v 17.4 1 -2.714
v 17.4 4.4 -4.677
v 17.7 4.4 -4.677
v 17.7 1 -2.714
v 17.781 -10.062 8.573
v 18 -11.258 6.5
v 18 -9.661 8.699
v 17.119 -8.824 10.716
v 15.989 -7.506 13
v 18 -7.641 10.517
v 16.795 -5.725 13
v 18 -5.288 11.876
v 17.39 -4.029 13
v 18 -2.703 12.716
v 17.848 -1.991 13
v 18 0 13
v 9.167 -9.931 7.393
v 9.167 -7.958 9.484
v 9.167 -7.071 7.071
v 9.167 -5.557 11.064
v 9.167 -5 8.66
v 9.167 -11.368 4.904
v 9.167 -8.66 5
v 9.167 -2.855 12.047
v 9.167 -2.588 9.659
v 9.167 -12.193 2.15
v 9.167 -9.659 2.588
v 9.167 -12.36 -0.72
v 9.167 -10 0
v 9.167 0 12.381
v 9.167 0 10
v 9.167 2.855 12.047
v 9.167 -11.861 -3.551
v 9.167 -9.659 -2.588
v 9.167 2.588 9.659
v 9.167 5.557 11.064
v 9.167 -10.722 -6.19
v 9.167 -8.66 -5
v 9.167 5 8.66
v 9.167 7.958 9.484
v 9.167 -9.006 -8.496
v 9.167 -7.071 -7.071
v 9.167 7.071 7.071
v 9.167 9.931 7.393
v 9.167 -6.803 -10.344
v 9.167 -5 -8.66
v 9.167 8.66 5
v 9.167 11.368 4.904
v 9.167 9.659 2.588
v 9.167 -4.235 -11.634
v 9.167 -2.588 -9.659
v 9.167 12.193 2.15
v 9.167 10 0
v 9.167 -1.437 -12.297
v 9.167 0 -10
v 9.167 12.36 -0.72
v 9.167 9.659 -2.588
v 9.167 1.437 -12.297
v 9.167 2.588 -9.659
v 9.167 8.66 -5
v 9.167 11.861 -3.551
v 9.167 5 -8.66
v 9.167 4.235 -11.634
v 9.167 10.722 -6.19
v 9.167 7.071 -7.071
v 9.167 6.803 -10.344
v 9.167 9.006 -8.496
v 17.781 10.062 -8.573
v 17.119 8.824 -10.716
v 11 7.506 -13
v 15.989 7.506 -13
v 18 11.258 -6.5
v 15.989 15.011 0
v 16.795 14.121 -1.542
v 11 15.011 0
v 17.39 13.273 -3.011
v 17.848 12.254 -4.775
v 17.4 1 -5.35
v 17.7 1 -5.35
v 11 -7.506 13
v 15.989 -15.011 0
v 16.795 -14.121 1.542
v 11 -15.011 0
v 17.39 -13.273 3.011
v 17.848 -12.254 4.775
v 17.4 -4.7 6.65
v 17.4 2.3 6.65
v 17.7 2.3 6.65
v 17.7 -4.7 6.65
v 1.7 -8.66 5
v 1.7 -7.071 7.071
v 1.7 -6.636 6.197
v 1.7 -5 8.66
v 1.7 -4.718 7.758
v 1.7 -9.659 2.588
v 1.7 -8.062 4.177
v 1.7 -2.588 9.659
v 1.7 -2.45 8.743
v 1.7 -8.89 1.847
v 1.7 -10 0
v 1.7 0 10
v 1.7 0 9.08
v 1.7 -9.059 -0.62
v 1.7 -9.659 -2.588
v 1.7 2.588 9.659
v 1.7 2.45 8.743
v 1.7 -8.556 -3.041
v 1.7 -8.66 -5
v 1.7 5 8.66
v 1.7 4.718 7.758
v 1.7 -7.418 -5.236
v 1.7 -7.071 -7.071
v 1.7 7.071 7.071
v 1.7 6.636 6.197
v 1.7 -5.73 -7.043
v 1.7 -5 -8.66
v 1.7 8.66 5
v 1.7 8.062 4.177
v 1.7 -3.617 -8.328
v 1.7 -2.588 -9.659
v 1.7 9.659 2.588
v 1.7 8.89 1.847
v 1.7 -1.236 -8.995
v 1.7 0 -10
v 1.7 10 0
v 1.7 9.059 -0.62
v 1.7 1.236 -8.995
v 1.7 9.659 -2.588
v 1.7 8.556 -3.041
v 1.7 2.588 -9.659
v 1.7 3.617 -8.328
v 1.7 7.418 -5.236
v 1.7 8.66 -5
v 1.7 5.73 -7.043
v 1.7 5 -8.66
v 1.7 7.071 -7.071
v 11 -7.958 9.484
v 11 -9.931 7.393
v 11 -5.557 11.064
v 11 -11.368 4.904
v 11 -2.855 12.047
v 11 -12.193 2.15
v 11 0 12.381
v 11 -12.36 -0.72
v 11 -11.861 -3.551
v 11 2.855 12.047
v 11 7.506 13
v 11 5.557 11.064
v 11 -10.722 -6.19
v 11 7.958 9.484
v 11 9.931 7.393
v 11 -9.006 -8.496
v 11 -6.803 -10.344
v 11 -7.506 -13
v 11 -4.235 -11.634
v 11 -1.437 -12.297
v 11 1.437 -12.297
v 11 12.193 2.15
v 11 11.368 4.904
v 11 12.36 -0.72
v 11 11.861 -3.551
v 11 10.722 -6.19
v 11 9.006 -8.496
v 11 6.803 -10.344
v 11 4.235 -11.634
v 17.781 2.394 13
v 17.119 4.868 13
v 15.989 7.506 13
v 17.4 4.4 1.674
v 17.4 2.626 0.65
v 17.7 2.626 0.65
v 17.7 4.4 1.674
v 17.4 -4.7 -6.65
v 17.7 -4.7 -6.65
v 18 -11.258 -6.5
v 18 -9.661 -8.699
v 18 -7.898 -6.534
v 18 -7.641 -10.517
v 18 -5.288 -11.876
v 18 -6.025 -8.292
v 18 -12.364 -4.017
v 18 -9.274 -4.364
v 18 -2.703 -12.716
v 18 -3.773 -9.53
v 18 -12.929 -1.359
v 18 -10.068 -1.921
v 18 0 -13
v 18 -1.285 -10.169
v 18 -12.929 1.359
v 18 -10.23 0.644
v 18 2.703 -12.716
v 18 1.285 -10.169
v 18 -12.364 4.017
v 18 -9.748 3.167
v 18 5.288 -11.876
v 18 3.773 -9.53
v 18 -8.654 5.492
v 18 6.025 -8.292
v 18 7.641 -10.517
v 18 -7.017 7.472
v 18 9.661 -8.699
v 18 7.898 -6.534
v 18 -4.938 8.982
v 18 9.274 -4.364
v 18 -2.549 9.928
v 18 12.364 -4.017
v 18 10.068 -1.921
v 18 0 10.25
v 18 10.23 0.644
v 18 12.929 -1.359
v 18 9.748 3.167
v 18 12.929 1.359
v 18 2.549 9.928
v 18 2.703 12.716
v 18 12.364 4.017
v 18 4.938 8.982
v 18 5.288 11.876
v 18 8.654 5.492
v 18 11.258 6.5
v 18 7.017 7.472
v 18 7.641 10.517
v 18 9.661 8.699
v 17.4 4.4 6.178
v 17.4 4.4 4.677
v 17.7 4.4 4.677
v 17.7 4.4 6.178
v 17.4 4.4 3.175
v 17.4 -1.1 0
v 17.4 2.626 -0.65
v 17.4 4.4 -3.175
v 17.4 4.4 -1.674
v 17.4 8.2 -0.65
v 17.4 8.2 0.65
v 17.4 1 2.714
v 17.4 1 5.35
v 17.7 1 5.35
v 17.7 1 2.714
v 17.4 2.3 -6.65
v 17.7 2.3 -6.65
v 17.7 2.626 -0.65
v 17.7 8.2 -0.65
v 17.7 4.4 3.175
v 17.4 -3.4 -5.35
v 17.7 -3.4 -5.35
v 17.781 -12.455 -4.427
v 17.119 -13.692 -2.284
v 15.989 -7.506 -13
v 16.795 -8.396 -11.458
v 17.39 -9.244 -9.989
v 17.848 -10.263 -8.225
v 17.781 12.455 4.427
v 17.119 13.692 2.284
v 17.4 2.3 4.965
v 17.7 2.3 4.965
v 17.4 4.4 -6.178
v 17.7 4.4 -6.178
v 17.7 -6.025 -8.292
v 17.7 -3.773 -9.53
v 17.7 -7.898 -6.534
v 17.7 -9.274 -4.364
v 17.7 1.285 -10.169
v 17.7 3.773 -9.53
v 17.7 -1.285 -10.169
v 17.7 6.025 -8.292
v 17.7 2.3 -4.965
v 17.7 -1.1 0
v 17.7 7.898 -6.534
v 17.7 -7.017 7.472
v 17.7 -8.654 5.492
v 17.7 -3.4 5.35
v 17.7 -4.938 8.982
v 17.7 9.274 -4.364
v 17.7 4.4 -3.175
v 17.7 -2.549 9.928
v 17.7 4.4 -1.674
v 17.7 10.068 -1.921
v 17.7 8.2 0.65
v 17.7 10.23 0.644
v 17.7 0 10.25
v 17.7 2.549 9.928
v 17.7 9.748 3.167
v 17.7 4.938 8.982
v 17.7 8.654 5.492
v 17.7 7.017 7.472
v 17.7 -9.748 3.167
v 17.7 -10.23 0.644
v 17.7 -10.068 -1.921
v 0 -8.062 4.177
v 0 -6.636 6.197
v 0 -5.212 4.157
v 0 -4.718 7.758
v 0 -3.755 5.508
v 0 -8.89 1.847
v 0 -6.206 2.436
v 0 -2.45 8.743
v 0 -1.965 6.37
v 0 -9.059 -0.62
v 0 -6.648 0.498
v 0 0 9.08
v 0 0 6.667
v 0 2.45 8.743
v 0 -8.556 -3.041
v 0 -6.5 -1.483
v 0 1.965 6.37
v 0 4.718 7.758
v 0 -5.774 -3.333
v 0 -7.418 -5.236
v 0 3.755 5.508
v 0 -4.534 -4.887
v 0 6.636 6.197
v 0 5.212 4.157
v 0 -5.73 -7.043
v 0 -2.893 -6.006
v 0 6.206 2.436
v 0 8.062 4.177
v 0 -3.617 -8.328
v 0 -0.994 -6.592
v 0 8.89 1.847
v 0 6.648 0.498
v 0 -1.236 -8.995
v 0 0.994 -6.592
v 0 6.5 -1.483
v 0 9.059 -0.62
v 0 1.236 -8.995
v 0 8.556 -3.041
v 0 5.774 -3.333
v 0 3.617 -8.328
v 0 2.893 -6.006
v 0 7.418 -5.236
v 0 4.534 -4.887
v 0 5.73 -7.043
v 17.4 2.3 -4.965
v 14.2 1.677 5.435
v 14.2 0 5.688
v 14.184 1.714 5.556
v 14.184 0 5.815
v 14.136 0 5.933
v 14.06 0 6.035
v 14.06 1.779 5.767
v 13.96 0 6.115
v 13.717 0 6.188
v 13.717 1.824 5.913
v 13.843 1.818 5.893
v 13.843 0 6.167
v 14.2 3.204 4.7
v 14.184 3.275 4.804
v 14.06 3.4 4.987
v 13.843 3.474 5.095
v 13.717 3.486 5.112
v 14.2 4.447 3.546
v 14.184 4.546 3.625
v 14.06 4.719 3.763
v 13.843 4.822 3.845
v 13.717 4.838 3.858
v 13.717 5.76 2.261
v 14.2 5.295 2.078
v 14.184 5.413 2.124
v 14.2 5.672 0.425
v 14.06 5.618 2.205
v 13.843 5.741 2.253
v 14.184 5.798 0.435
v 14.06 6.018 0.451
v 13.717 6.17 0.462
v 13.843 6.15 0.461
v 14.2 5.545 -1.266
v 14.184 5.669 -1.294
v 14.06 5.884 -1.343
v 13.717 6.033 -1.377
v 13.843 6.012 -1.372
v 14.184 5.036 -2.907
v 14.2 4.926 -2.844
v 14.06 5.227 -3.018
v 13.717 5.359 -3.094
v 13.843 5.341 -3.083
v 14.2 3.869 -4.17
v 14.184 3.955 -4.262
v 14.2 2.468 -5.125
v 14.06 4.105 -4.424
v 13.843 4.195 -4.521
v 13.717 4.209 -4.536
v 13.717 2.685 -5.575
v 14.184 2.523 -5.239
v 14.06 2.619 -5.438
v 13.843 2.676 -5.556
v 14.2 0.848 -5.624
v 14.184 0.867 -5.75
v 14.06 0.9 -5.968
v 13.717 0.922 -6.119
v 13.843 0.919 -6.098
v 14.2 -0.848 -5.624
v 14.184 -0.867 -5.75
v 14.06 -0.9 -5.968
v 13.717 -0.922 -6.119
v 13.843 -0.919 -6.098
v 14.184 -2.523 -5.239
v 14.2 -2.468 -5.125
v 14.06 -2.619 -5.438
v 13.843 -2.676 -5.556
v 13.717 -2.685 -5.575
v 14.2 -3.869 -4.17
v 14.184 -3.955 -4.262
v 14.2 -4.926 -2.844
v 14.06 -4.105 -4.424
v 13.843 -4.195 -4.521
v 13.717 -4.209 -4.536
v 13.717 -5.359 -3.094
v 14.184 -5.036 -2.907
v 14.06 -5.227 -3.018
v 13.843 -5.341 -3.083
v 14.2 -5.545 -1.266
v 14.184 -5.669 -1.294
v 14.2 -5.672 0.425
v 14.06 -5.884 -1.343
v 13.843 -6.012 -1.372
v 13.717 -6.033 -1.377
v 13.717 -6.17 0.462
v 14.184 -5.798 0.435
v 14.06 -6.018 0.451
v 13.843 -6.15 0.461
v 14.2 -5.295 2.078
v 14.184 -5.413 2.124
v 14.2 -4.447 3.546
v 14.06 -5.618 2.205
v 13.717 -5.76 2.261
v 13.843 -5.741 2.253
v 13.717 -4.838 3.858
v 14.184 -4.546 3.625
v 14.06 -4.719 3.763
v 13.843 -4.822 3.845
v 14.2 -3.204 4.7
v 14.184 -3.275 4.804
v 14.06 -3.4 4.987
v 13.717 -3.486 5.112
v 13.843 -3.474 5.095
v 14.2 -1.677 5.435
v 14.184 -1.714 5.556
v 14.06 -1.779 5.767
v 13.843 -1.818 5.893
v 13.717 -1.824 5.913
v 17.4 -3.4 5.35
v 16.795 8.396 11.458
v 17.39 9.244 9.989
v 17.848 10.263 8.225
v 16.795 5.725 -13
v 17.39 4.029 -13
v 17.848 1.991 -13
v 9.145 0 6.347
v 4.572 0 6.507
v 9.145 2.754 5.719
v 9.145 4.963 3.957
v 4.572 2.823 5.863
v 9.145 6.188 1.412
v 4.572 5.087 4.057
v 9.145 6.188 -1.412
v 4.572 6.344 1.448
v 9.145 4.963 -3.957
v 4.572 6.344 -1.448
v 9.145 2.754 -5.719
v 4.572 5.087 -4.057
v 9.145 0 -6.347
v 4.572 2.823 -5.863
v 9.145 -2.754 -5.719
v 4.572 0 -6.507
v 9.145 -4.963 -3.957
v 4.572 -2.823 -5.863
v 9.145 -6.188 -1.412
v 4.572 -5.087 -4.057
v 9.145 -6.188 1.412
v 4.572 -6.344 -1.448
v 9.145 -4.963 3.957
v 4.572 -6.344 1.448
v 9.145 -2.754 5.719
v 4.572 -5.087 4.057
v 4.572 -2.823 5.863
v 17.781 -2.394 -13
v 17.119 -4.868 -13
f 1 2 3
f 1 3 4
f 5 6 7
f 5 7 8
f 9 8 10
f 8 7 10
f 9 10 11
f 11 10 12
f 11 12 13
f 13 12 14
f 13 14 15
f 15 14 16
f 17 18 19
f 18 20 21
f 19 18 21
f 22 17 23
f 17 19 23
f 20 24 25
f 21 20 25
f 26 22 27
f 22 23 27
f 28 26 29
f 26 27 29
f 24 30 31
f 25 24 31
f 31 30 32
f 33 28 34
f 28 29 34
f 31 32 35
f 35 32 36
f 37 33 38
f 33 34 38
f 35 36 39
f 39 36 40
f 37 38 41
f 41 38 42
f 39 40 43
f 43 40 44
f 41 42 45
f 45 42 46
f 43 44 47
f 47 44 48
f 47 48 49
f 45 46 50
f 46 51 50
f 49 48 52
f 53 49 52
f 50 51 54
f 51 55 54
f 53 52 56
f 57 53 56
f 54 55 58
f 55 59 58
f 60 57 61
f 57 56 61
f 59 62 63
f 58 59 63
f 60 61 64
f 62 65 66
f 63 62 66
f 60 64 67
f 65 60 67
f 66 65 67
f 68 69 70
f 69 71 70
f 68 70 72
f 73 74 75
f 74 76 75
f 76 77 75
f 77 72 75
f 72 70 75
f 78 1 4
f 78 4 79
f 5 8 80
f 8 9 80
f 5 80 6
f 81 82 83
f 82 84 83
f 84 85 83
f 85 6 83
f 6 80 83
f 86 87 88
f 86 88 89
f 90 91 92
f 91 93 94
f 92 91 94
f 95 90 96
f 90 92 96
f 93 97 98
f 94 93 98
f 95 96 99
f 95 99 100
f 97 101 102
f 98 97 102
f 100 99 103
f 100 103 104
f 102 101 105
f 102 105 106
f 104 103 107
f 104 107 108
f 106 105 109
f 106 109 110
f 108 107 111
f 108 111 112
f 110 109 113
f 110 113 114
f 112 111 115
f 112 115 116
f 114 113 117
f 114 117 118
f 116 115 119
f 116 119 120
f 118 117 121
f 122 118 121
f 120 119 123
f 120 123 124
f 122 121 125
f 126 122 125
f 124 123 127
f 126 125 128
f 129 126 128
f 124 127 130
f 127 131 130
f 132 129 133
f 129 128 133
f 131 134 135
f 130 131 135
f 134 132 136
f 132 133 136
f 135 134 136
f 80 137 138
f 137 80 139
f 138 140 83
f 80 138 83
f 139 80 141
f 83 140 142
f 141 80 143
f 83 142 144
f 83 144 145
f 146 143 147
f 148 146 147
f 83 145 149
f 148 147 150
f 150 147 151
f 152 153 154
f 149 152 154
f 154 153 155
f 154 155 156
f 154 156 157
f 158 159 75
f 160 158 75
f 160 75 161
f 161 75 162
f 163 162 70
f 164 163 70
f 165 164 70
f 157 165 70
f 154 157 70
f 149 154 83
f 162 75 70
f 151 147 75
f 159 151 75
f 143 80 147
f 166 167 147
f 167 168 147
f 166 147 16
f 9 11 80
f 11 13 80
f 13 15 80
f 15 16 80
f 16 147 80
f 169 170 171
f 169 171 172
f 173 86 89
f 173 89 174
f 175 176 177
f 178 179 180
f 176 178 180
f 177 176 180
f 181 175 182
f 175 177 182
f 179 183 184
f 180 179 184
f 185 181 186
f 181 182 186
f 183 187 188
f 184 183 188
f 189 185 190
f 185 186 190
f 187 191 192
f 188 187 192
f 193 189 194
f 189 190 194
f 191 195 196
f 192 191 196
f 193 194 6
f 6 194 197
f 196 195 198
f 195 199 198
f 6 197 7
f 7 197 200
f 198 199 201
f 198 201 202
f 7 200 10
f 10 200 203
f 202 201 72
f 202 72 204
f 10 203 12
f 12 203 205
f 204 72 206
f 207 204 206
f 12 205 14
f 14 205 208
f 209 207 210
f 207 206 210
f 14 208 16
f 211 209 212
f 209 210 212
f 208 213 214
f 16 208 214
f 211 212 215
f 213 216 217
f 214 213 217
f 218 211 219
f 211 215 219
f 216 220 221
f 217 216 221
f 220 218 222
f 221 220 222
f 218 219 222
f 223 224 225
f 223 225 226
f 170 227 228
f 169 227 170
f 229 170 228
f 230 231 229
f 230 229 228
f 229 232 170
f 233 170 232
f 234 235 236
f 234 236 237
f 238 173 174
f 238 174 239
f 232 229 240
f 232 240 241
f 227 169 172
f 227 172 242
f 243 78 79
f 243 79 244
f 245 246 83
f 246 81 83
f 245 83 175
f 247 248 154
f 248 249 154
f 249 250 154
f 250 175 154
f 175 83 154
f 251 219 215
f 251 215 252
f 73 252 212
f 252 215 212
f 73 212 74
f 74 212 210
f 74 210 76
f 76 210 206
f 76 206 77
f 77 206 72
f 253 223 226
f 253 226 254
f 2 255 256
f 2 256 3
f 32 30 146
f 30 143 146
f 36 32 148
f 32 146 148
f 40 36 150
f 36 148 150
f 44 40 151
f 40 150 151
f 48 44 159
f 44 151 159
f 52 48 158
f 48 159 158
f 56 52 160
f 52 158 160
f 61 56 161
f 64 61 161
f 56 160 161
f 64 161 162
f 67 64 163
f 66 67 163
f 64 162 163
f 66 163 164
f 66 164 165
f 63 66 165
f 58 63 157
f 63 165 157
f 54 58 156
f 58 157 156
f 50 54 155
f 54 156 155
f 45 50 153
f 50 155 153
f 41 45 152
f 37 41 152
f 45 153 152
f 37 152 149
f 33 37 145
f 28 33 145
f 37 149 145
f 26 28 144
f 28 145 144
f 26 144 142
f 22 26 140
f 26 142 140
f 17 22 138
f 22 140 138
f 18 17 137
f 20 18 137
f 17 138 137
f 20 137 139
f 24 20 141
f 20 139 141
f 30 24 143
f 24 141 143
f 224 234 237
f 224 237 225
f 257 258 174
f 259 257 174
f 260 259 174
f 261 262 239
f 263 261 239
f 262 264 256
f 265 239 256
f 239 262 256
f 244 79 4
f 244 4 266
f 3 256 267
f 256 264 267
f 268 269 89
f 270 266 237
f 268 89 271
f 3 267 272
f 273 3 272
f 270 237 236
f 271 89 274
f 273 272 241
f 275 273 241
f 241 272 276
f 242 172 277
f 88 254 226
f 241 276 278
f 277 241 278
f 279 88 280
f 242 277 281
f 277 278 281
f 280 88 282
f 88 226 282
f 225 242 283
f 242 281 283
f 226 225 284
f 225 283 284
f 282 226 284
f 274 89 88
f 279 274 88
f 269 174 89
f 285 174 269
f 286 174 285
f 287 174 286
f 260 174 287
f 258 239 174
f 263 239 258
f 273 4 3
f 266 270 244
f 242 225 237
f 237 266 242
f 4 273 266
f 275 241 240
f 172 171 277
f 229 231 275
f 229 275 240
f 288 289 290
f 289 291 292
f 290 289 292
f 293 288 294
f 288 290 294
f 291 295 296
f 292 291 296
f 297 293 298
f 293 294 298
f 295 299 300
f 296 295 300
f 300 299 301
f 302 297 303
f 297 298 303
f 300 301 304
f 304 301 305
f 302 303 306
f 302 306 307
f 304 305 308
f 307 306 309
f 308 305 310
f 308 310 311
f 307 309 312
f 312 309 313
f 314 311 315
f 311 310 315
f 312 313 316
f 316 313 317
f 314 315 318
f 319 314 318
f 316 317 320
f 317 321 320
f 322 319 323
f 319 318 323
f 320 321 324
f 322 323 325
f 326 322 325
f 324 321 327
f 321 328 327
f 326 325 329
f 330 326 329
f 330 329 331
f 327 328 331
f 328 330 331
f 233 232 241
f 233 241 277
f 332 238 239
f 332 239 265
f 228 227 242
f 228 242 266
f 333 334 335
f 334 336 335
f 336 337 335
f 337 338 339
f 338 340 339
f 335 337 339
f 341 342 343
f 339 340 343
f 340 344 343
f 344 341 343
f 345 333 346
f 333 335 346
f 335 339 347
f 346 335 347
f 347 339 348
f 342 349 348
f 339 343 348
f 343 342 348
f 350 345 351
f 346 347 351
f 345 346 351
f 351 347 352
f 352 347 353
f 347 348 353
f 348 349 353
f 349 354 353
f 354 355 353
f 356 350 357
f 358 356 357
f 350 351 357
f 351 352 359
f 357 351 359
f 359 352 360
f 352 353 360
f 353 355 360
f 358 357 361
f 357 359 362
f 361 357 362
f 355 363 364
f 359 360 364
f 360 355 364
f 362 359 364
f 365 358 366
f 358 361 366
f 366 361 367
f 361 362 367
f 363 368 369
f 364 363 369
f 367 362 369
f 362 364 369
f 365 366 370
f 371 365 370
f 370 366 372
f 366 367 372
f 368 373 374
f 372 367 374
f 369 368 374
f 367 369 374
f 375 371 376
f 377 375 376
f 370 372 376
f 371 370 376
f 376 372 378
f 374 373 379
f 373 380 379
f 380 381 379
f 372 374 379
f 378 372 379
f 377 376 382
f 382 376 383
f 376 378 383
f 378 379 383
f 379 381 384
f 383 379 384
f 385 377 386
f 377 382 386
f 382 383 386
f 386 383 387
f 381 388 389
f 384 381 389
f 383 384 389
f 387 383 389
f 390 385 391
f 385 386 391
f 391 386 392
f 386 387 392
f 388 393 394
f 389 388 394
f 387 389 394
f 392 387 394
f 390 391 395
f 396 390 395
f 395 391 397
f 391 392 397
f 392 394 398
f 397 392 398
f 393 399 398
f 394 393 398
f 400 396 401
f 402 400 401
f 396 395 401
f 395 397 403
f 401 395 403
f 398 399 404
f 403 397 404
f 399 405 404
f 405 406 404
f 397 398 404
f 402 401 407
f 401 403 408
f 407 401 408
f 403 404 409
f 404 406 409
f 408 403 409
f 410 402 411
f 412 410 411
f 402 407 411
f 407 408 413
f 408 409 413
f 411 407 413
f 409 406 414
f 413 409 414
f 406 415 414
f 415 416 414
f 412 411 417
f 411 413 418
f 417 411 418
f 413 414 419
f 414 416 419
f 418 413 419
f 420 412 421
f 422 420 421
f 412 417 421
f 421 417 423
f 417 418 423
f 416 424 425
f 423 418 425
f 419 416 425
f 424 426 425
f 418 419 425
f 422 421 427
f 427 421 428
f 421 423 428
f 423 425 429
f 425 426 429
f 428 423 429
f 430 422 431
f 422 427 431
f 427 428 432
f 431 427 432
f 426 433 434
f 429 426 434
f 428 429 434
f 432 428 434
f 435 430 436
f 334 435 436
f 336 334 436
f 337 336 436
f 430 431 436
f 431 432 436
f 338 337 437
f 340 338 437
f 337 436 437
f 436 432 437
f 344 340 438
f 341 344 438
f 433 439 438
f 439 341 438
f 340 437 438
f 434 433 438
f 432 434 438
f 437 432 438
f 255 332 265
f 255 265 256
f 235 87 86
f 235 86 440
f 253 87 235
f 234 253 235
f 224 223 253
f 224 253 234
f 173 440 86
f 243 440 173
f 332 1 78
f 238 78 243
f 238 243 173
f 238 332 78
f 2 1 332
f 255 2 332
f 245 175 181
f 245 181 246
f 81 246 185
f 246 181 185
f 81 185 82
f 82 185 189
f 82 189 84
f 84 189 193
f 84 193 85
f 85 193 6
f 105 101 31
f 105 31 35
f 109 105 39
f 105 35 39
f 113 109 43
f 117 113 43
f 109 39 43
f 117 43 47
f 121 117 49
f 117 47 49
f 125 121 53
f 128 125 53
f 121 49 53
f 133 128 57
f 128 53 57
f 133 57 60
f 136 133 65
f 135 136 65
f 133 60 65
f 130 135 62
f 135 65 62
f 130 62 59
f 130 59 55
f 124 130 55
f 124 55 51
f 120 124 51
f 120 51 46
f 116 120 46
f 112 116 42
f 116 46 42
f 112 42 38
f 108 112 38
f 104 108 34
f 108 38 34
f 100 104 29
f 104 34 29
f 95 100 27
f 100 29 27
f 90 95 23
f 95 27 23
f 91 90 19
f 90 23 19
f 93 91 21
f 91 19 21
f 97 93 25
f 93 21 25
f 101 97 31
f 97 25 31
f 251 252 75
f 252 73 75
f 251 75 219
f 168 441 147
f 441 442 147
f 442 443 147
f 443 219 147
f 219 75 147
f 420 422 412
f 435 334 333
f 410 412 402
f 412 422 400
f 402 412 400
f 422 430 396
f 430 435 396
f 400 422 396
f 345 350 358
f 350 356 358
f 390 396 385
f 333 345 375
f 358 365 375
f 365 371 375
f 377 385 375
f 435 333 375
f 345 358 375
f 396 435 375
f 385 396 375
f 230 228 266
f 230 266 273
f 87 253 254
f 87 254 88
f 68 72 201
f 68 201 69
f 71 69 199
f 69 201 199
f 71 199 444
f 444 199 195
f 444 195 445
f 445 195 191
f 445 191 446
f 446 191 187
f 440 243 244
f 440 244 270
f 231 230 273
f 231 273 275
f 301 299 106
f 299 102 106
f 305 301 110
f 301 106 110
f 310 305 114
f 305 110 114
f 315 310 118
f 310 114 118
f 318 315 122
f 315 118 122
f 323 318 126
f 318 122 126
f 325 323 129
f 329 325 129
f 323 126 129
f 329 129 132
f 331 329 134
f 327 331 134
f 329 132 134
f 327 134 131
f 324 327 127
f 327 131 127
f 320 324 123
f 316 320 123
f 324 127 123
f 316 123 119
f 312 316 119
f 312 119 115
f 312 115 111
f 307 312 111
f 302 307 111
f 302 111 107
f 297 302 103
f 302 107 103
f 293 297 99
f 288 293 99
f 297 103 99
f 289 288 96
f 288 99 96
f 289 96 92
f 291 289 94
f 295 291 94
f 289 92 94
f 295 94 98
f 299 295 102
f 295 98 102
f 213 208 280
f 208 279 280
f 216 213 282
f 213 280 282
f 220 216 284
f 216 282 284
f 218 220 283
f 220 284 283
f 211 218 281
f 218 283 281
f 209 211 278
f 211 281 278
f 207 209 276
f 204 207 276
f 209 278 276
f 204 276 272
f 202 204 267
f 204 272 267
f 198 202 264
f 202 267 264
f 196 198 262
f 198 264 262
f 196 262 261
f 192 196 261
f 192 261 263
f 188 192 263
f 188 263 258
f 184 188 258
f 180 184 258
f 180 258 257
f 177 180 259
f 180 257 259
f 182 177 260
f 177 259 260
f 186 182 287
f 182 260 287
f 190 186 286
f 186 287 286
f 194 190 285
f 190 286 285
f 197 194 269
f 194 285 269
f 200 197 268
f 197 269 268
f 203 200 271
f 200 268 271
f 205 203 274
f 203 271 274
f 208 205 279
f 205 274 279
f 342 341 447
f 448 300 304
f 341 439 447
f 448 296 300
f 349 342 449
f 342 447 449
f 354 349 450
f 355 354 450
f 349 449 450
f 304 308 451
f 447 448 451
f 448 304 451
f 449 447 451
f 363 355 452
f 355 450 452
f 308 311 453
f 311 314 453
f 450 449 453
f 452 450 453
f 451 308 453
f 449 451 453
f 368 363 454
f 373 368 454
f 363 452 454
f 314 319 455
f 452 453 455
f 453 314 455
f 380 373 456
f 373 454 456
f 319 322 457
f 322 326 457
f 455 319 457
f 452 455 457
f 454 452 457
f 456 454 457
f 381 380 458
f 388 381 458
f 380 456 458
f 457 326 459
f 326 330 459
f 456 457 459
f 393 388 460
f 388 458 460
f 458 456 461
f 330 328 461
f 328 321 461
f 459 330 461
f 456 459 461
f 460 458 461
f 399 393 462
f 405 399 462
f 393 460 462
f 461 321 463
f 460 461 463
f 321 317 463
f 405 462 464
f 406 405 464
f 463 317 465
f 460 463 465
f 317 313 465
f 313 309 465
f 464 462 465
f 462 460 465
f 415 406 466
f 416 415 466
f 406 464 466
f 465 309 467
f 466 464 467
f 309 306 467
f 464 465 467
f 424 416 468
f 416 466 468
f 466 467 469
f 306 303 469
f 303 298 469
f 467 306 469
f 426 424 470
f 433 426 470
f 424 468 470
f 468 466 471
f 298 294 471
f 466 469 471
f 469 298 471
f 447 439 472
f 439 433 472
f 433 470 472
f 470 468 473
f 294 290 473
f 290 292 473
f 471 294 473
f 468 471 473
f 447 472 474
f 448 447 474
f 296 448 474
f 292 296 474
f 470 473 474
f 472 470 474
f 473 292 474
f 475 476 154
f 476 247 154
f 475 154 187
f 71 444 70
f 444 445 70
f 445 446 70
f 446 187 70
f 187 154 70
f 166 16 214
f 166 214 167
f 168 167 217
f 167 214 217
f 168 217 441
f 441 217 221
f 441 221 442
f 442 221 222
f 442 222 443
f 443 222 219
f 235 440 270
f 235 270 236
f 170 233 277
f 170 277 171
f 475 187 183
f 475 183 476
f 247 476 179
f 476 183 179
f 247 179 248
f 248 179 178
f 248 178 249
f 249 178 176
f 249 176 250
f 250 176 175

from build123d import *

# Parameters (mm, degrees)
TAGLIO_ESTRUSIONE1_DEPTH      = 0.3
TAGLIO_ESTRUSIONE1_DEPTH_BACK = 0.3
TAGLIO_ESTRUSIONE2_DEPTH      = 0.3
TAGLIO_ESTRUSIONE2_DEPTH_BACK = 0.3
TAGLIO_ESTRUSIONE3_DEPTH      = 10.701
TAGLIO_ESTRUSIONE3_DEPTH_BACK = 10.701


with BuildPart() as part:
    # Schizzo1 → Rivoluzione1 (revolve)
    with BuildSketch(Plane.XY):
        with BuildLine():
            Line((14.2, 0), (14.2, 5.687947352))
            ThreePointArc((14.2, 5.687947352), (14.0596699, 6.035276538), (13.717449748, 6.187642766))
            Line((13.717449748, 6.187642766), (0, 6.666666667))
            Line((0, 6.666666667), (0, 9.0798475))
            Line((0, 9.0798475), (1.7, 9.0798475))
            Line((1.7, 9.0798475), (1.7, 10))
            Line((1.7, 10), (9.166666667, 10))
            Line((9.166666667, 10), (9.166666667, 12.380952381))
            Line((9.166666667, 12.380952381), (11, 12.380952381))
            Line((11, 12.380952381), (11, 20))
            Line((11, 20), (18, 13))
            Line((18, 13), (18, 10.25))
            Line((18, 10.25), (17.7, 10.25))
            Line((17.7, 10.25), (17.7, 0))
            Line((17.7, 0), (14.2, 0))
        make_face()
    revolve(axis=Axis((18, 0, 0), (-1, 0, 0)))

    # Schizzo2 → Taglio-Estrusione1 (cut, two sides: drawn at the far end of the back side and taken through both)
    with BuildSketch(Plane(origin=(17.7, 0, 0), x_dir=(0, 0, -1), z_dir=(1, 0, 0)).offset(-TAGLIO_ESTRUSIONE1_DEPTH_BACK)):
        Polygon((-6.65, -4.7), (6.65, -4.7), (6.65, 2.3), (4.96521, 2.3), (6.17765, 4.4), (4.67654, 4.4), (2.71355, 1), (5.35, 1), (5.35, -3.4), (-5.35, -3.4), (-5.35, 1), (-2.71355, 1), (-4.67654, 4.4), (-6.17765, 4.4), (-4.96521, 2.3), (-6.65, 2.3), align=None)
    extrude(amount=TAGLIO_ESTRUSIONE1_DEPTH + TAGLIO_ESTRUSIONE1_DEPTH_BACK, mode=Mode.SUBTRACT)

    # Schizzo3 → Taglio-Estrusione2 (cut, two sides: drawn at the far end of the back side and taken through both)
    with BuildSketch(Plane(origin=(17.7, 0, 0), x_dir=(0, 0, -1), z_dir=(1, 0, 0)).offset(-TAGLIO_ESTRUSIONE2_DEPTH_BACK)):
        Polygon((-3.17543, 4.4), (0, -1.1), (3.17543, 4.4), (1.67432, 4.4), (0.65, 2.62583), (0.65, 8.2), (-0.65, 8.2), (-0.65, 2.62583), (-1.67432, 4.4), align=None)
    extrude(amount=TAGLIO_ESTRUSIONE2_DEPTH + TAGLIO_ESTRUSIONE2_DEPTH_BACK, mode=Mode.SUBTRACT)

    # Schizzo4 → Taglio-Estrusione3 (cut, two sides: drawn at the far end of the back side and taken through both)
    with BuildSketch(Plane(origin=(17.7, 0, 0), x_dir=(0, 0, -1), z_dir=(1, 0, 0)).offset(-TAGLIO_ESTRUSIONE3_DEPTH_BACK)):
        Polygon((-26, -15.011106999), (0, -30.022213998), (26, -15.011106999), (26, 15.011106999), (0, 30.022213998), (-26, 15.011106999), align=None)
        Polygon((-13, -7.505553499), (0, -15.011106999), (13, -7.505553499), (13, 7.505553499), (0, 15.011106999), (-13, 7.505553499), align=None, mode=Mode.SUBTRACT)
    extrude(amount=TAGLIO_ESTRUSIONE3_DEPTH + TAGLIO_ESTRUSIONE3_DEPTH_BACK, mode=Mode.SUBTRACT)


solid = part.part
